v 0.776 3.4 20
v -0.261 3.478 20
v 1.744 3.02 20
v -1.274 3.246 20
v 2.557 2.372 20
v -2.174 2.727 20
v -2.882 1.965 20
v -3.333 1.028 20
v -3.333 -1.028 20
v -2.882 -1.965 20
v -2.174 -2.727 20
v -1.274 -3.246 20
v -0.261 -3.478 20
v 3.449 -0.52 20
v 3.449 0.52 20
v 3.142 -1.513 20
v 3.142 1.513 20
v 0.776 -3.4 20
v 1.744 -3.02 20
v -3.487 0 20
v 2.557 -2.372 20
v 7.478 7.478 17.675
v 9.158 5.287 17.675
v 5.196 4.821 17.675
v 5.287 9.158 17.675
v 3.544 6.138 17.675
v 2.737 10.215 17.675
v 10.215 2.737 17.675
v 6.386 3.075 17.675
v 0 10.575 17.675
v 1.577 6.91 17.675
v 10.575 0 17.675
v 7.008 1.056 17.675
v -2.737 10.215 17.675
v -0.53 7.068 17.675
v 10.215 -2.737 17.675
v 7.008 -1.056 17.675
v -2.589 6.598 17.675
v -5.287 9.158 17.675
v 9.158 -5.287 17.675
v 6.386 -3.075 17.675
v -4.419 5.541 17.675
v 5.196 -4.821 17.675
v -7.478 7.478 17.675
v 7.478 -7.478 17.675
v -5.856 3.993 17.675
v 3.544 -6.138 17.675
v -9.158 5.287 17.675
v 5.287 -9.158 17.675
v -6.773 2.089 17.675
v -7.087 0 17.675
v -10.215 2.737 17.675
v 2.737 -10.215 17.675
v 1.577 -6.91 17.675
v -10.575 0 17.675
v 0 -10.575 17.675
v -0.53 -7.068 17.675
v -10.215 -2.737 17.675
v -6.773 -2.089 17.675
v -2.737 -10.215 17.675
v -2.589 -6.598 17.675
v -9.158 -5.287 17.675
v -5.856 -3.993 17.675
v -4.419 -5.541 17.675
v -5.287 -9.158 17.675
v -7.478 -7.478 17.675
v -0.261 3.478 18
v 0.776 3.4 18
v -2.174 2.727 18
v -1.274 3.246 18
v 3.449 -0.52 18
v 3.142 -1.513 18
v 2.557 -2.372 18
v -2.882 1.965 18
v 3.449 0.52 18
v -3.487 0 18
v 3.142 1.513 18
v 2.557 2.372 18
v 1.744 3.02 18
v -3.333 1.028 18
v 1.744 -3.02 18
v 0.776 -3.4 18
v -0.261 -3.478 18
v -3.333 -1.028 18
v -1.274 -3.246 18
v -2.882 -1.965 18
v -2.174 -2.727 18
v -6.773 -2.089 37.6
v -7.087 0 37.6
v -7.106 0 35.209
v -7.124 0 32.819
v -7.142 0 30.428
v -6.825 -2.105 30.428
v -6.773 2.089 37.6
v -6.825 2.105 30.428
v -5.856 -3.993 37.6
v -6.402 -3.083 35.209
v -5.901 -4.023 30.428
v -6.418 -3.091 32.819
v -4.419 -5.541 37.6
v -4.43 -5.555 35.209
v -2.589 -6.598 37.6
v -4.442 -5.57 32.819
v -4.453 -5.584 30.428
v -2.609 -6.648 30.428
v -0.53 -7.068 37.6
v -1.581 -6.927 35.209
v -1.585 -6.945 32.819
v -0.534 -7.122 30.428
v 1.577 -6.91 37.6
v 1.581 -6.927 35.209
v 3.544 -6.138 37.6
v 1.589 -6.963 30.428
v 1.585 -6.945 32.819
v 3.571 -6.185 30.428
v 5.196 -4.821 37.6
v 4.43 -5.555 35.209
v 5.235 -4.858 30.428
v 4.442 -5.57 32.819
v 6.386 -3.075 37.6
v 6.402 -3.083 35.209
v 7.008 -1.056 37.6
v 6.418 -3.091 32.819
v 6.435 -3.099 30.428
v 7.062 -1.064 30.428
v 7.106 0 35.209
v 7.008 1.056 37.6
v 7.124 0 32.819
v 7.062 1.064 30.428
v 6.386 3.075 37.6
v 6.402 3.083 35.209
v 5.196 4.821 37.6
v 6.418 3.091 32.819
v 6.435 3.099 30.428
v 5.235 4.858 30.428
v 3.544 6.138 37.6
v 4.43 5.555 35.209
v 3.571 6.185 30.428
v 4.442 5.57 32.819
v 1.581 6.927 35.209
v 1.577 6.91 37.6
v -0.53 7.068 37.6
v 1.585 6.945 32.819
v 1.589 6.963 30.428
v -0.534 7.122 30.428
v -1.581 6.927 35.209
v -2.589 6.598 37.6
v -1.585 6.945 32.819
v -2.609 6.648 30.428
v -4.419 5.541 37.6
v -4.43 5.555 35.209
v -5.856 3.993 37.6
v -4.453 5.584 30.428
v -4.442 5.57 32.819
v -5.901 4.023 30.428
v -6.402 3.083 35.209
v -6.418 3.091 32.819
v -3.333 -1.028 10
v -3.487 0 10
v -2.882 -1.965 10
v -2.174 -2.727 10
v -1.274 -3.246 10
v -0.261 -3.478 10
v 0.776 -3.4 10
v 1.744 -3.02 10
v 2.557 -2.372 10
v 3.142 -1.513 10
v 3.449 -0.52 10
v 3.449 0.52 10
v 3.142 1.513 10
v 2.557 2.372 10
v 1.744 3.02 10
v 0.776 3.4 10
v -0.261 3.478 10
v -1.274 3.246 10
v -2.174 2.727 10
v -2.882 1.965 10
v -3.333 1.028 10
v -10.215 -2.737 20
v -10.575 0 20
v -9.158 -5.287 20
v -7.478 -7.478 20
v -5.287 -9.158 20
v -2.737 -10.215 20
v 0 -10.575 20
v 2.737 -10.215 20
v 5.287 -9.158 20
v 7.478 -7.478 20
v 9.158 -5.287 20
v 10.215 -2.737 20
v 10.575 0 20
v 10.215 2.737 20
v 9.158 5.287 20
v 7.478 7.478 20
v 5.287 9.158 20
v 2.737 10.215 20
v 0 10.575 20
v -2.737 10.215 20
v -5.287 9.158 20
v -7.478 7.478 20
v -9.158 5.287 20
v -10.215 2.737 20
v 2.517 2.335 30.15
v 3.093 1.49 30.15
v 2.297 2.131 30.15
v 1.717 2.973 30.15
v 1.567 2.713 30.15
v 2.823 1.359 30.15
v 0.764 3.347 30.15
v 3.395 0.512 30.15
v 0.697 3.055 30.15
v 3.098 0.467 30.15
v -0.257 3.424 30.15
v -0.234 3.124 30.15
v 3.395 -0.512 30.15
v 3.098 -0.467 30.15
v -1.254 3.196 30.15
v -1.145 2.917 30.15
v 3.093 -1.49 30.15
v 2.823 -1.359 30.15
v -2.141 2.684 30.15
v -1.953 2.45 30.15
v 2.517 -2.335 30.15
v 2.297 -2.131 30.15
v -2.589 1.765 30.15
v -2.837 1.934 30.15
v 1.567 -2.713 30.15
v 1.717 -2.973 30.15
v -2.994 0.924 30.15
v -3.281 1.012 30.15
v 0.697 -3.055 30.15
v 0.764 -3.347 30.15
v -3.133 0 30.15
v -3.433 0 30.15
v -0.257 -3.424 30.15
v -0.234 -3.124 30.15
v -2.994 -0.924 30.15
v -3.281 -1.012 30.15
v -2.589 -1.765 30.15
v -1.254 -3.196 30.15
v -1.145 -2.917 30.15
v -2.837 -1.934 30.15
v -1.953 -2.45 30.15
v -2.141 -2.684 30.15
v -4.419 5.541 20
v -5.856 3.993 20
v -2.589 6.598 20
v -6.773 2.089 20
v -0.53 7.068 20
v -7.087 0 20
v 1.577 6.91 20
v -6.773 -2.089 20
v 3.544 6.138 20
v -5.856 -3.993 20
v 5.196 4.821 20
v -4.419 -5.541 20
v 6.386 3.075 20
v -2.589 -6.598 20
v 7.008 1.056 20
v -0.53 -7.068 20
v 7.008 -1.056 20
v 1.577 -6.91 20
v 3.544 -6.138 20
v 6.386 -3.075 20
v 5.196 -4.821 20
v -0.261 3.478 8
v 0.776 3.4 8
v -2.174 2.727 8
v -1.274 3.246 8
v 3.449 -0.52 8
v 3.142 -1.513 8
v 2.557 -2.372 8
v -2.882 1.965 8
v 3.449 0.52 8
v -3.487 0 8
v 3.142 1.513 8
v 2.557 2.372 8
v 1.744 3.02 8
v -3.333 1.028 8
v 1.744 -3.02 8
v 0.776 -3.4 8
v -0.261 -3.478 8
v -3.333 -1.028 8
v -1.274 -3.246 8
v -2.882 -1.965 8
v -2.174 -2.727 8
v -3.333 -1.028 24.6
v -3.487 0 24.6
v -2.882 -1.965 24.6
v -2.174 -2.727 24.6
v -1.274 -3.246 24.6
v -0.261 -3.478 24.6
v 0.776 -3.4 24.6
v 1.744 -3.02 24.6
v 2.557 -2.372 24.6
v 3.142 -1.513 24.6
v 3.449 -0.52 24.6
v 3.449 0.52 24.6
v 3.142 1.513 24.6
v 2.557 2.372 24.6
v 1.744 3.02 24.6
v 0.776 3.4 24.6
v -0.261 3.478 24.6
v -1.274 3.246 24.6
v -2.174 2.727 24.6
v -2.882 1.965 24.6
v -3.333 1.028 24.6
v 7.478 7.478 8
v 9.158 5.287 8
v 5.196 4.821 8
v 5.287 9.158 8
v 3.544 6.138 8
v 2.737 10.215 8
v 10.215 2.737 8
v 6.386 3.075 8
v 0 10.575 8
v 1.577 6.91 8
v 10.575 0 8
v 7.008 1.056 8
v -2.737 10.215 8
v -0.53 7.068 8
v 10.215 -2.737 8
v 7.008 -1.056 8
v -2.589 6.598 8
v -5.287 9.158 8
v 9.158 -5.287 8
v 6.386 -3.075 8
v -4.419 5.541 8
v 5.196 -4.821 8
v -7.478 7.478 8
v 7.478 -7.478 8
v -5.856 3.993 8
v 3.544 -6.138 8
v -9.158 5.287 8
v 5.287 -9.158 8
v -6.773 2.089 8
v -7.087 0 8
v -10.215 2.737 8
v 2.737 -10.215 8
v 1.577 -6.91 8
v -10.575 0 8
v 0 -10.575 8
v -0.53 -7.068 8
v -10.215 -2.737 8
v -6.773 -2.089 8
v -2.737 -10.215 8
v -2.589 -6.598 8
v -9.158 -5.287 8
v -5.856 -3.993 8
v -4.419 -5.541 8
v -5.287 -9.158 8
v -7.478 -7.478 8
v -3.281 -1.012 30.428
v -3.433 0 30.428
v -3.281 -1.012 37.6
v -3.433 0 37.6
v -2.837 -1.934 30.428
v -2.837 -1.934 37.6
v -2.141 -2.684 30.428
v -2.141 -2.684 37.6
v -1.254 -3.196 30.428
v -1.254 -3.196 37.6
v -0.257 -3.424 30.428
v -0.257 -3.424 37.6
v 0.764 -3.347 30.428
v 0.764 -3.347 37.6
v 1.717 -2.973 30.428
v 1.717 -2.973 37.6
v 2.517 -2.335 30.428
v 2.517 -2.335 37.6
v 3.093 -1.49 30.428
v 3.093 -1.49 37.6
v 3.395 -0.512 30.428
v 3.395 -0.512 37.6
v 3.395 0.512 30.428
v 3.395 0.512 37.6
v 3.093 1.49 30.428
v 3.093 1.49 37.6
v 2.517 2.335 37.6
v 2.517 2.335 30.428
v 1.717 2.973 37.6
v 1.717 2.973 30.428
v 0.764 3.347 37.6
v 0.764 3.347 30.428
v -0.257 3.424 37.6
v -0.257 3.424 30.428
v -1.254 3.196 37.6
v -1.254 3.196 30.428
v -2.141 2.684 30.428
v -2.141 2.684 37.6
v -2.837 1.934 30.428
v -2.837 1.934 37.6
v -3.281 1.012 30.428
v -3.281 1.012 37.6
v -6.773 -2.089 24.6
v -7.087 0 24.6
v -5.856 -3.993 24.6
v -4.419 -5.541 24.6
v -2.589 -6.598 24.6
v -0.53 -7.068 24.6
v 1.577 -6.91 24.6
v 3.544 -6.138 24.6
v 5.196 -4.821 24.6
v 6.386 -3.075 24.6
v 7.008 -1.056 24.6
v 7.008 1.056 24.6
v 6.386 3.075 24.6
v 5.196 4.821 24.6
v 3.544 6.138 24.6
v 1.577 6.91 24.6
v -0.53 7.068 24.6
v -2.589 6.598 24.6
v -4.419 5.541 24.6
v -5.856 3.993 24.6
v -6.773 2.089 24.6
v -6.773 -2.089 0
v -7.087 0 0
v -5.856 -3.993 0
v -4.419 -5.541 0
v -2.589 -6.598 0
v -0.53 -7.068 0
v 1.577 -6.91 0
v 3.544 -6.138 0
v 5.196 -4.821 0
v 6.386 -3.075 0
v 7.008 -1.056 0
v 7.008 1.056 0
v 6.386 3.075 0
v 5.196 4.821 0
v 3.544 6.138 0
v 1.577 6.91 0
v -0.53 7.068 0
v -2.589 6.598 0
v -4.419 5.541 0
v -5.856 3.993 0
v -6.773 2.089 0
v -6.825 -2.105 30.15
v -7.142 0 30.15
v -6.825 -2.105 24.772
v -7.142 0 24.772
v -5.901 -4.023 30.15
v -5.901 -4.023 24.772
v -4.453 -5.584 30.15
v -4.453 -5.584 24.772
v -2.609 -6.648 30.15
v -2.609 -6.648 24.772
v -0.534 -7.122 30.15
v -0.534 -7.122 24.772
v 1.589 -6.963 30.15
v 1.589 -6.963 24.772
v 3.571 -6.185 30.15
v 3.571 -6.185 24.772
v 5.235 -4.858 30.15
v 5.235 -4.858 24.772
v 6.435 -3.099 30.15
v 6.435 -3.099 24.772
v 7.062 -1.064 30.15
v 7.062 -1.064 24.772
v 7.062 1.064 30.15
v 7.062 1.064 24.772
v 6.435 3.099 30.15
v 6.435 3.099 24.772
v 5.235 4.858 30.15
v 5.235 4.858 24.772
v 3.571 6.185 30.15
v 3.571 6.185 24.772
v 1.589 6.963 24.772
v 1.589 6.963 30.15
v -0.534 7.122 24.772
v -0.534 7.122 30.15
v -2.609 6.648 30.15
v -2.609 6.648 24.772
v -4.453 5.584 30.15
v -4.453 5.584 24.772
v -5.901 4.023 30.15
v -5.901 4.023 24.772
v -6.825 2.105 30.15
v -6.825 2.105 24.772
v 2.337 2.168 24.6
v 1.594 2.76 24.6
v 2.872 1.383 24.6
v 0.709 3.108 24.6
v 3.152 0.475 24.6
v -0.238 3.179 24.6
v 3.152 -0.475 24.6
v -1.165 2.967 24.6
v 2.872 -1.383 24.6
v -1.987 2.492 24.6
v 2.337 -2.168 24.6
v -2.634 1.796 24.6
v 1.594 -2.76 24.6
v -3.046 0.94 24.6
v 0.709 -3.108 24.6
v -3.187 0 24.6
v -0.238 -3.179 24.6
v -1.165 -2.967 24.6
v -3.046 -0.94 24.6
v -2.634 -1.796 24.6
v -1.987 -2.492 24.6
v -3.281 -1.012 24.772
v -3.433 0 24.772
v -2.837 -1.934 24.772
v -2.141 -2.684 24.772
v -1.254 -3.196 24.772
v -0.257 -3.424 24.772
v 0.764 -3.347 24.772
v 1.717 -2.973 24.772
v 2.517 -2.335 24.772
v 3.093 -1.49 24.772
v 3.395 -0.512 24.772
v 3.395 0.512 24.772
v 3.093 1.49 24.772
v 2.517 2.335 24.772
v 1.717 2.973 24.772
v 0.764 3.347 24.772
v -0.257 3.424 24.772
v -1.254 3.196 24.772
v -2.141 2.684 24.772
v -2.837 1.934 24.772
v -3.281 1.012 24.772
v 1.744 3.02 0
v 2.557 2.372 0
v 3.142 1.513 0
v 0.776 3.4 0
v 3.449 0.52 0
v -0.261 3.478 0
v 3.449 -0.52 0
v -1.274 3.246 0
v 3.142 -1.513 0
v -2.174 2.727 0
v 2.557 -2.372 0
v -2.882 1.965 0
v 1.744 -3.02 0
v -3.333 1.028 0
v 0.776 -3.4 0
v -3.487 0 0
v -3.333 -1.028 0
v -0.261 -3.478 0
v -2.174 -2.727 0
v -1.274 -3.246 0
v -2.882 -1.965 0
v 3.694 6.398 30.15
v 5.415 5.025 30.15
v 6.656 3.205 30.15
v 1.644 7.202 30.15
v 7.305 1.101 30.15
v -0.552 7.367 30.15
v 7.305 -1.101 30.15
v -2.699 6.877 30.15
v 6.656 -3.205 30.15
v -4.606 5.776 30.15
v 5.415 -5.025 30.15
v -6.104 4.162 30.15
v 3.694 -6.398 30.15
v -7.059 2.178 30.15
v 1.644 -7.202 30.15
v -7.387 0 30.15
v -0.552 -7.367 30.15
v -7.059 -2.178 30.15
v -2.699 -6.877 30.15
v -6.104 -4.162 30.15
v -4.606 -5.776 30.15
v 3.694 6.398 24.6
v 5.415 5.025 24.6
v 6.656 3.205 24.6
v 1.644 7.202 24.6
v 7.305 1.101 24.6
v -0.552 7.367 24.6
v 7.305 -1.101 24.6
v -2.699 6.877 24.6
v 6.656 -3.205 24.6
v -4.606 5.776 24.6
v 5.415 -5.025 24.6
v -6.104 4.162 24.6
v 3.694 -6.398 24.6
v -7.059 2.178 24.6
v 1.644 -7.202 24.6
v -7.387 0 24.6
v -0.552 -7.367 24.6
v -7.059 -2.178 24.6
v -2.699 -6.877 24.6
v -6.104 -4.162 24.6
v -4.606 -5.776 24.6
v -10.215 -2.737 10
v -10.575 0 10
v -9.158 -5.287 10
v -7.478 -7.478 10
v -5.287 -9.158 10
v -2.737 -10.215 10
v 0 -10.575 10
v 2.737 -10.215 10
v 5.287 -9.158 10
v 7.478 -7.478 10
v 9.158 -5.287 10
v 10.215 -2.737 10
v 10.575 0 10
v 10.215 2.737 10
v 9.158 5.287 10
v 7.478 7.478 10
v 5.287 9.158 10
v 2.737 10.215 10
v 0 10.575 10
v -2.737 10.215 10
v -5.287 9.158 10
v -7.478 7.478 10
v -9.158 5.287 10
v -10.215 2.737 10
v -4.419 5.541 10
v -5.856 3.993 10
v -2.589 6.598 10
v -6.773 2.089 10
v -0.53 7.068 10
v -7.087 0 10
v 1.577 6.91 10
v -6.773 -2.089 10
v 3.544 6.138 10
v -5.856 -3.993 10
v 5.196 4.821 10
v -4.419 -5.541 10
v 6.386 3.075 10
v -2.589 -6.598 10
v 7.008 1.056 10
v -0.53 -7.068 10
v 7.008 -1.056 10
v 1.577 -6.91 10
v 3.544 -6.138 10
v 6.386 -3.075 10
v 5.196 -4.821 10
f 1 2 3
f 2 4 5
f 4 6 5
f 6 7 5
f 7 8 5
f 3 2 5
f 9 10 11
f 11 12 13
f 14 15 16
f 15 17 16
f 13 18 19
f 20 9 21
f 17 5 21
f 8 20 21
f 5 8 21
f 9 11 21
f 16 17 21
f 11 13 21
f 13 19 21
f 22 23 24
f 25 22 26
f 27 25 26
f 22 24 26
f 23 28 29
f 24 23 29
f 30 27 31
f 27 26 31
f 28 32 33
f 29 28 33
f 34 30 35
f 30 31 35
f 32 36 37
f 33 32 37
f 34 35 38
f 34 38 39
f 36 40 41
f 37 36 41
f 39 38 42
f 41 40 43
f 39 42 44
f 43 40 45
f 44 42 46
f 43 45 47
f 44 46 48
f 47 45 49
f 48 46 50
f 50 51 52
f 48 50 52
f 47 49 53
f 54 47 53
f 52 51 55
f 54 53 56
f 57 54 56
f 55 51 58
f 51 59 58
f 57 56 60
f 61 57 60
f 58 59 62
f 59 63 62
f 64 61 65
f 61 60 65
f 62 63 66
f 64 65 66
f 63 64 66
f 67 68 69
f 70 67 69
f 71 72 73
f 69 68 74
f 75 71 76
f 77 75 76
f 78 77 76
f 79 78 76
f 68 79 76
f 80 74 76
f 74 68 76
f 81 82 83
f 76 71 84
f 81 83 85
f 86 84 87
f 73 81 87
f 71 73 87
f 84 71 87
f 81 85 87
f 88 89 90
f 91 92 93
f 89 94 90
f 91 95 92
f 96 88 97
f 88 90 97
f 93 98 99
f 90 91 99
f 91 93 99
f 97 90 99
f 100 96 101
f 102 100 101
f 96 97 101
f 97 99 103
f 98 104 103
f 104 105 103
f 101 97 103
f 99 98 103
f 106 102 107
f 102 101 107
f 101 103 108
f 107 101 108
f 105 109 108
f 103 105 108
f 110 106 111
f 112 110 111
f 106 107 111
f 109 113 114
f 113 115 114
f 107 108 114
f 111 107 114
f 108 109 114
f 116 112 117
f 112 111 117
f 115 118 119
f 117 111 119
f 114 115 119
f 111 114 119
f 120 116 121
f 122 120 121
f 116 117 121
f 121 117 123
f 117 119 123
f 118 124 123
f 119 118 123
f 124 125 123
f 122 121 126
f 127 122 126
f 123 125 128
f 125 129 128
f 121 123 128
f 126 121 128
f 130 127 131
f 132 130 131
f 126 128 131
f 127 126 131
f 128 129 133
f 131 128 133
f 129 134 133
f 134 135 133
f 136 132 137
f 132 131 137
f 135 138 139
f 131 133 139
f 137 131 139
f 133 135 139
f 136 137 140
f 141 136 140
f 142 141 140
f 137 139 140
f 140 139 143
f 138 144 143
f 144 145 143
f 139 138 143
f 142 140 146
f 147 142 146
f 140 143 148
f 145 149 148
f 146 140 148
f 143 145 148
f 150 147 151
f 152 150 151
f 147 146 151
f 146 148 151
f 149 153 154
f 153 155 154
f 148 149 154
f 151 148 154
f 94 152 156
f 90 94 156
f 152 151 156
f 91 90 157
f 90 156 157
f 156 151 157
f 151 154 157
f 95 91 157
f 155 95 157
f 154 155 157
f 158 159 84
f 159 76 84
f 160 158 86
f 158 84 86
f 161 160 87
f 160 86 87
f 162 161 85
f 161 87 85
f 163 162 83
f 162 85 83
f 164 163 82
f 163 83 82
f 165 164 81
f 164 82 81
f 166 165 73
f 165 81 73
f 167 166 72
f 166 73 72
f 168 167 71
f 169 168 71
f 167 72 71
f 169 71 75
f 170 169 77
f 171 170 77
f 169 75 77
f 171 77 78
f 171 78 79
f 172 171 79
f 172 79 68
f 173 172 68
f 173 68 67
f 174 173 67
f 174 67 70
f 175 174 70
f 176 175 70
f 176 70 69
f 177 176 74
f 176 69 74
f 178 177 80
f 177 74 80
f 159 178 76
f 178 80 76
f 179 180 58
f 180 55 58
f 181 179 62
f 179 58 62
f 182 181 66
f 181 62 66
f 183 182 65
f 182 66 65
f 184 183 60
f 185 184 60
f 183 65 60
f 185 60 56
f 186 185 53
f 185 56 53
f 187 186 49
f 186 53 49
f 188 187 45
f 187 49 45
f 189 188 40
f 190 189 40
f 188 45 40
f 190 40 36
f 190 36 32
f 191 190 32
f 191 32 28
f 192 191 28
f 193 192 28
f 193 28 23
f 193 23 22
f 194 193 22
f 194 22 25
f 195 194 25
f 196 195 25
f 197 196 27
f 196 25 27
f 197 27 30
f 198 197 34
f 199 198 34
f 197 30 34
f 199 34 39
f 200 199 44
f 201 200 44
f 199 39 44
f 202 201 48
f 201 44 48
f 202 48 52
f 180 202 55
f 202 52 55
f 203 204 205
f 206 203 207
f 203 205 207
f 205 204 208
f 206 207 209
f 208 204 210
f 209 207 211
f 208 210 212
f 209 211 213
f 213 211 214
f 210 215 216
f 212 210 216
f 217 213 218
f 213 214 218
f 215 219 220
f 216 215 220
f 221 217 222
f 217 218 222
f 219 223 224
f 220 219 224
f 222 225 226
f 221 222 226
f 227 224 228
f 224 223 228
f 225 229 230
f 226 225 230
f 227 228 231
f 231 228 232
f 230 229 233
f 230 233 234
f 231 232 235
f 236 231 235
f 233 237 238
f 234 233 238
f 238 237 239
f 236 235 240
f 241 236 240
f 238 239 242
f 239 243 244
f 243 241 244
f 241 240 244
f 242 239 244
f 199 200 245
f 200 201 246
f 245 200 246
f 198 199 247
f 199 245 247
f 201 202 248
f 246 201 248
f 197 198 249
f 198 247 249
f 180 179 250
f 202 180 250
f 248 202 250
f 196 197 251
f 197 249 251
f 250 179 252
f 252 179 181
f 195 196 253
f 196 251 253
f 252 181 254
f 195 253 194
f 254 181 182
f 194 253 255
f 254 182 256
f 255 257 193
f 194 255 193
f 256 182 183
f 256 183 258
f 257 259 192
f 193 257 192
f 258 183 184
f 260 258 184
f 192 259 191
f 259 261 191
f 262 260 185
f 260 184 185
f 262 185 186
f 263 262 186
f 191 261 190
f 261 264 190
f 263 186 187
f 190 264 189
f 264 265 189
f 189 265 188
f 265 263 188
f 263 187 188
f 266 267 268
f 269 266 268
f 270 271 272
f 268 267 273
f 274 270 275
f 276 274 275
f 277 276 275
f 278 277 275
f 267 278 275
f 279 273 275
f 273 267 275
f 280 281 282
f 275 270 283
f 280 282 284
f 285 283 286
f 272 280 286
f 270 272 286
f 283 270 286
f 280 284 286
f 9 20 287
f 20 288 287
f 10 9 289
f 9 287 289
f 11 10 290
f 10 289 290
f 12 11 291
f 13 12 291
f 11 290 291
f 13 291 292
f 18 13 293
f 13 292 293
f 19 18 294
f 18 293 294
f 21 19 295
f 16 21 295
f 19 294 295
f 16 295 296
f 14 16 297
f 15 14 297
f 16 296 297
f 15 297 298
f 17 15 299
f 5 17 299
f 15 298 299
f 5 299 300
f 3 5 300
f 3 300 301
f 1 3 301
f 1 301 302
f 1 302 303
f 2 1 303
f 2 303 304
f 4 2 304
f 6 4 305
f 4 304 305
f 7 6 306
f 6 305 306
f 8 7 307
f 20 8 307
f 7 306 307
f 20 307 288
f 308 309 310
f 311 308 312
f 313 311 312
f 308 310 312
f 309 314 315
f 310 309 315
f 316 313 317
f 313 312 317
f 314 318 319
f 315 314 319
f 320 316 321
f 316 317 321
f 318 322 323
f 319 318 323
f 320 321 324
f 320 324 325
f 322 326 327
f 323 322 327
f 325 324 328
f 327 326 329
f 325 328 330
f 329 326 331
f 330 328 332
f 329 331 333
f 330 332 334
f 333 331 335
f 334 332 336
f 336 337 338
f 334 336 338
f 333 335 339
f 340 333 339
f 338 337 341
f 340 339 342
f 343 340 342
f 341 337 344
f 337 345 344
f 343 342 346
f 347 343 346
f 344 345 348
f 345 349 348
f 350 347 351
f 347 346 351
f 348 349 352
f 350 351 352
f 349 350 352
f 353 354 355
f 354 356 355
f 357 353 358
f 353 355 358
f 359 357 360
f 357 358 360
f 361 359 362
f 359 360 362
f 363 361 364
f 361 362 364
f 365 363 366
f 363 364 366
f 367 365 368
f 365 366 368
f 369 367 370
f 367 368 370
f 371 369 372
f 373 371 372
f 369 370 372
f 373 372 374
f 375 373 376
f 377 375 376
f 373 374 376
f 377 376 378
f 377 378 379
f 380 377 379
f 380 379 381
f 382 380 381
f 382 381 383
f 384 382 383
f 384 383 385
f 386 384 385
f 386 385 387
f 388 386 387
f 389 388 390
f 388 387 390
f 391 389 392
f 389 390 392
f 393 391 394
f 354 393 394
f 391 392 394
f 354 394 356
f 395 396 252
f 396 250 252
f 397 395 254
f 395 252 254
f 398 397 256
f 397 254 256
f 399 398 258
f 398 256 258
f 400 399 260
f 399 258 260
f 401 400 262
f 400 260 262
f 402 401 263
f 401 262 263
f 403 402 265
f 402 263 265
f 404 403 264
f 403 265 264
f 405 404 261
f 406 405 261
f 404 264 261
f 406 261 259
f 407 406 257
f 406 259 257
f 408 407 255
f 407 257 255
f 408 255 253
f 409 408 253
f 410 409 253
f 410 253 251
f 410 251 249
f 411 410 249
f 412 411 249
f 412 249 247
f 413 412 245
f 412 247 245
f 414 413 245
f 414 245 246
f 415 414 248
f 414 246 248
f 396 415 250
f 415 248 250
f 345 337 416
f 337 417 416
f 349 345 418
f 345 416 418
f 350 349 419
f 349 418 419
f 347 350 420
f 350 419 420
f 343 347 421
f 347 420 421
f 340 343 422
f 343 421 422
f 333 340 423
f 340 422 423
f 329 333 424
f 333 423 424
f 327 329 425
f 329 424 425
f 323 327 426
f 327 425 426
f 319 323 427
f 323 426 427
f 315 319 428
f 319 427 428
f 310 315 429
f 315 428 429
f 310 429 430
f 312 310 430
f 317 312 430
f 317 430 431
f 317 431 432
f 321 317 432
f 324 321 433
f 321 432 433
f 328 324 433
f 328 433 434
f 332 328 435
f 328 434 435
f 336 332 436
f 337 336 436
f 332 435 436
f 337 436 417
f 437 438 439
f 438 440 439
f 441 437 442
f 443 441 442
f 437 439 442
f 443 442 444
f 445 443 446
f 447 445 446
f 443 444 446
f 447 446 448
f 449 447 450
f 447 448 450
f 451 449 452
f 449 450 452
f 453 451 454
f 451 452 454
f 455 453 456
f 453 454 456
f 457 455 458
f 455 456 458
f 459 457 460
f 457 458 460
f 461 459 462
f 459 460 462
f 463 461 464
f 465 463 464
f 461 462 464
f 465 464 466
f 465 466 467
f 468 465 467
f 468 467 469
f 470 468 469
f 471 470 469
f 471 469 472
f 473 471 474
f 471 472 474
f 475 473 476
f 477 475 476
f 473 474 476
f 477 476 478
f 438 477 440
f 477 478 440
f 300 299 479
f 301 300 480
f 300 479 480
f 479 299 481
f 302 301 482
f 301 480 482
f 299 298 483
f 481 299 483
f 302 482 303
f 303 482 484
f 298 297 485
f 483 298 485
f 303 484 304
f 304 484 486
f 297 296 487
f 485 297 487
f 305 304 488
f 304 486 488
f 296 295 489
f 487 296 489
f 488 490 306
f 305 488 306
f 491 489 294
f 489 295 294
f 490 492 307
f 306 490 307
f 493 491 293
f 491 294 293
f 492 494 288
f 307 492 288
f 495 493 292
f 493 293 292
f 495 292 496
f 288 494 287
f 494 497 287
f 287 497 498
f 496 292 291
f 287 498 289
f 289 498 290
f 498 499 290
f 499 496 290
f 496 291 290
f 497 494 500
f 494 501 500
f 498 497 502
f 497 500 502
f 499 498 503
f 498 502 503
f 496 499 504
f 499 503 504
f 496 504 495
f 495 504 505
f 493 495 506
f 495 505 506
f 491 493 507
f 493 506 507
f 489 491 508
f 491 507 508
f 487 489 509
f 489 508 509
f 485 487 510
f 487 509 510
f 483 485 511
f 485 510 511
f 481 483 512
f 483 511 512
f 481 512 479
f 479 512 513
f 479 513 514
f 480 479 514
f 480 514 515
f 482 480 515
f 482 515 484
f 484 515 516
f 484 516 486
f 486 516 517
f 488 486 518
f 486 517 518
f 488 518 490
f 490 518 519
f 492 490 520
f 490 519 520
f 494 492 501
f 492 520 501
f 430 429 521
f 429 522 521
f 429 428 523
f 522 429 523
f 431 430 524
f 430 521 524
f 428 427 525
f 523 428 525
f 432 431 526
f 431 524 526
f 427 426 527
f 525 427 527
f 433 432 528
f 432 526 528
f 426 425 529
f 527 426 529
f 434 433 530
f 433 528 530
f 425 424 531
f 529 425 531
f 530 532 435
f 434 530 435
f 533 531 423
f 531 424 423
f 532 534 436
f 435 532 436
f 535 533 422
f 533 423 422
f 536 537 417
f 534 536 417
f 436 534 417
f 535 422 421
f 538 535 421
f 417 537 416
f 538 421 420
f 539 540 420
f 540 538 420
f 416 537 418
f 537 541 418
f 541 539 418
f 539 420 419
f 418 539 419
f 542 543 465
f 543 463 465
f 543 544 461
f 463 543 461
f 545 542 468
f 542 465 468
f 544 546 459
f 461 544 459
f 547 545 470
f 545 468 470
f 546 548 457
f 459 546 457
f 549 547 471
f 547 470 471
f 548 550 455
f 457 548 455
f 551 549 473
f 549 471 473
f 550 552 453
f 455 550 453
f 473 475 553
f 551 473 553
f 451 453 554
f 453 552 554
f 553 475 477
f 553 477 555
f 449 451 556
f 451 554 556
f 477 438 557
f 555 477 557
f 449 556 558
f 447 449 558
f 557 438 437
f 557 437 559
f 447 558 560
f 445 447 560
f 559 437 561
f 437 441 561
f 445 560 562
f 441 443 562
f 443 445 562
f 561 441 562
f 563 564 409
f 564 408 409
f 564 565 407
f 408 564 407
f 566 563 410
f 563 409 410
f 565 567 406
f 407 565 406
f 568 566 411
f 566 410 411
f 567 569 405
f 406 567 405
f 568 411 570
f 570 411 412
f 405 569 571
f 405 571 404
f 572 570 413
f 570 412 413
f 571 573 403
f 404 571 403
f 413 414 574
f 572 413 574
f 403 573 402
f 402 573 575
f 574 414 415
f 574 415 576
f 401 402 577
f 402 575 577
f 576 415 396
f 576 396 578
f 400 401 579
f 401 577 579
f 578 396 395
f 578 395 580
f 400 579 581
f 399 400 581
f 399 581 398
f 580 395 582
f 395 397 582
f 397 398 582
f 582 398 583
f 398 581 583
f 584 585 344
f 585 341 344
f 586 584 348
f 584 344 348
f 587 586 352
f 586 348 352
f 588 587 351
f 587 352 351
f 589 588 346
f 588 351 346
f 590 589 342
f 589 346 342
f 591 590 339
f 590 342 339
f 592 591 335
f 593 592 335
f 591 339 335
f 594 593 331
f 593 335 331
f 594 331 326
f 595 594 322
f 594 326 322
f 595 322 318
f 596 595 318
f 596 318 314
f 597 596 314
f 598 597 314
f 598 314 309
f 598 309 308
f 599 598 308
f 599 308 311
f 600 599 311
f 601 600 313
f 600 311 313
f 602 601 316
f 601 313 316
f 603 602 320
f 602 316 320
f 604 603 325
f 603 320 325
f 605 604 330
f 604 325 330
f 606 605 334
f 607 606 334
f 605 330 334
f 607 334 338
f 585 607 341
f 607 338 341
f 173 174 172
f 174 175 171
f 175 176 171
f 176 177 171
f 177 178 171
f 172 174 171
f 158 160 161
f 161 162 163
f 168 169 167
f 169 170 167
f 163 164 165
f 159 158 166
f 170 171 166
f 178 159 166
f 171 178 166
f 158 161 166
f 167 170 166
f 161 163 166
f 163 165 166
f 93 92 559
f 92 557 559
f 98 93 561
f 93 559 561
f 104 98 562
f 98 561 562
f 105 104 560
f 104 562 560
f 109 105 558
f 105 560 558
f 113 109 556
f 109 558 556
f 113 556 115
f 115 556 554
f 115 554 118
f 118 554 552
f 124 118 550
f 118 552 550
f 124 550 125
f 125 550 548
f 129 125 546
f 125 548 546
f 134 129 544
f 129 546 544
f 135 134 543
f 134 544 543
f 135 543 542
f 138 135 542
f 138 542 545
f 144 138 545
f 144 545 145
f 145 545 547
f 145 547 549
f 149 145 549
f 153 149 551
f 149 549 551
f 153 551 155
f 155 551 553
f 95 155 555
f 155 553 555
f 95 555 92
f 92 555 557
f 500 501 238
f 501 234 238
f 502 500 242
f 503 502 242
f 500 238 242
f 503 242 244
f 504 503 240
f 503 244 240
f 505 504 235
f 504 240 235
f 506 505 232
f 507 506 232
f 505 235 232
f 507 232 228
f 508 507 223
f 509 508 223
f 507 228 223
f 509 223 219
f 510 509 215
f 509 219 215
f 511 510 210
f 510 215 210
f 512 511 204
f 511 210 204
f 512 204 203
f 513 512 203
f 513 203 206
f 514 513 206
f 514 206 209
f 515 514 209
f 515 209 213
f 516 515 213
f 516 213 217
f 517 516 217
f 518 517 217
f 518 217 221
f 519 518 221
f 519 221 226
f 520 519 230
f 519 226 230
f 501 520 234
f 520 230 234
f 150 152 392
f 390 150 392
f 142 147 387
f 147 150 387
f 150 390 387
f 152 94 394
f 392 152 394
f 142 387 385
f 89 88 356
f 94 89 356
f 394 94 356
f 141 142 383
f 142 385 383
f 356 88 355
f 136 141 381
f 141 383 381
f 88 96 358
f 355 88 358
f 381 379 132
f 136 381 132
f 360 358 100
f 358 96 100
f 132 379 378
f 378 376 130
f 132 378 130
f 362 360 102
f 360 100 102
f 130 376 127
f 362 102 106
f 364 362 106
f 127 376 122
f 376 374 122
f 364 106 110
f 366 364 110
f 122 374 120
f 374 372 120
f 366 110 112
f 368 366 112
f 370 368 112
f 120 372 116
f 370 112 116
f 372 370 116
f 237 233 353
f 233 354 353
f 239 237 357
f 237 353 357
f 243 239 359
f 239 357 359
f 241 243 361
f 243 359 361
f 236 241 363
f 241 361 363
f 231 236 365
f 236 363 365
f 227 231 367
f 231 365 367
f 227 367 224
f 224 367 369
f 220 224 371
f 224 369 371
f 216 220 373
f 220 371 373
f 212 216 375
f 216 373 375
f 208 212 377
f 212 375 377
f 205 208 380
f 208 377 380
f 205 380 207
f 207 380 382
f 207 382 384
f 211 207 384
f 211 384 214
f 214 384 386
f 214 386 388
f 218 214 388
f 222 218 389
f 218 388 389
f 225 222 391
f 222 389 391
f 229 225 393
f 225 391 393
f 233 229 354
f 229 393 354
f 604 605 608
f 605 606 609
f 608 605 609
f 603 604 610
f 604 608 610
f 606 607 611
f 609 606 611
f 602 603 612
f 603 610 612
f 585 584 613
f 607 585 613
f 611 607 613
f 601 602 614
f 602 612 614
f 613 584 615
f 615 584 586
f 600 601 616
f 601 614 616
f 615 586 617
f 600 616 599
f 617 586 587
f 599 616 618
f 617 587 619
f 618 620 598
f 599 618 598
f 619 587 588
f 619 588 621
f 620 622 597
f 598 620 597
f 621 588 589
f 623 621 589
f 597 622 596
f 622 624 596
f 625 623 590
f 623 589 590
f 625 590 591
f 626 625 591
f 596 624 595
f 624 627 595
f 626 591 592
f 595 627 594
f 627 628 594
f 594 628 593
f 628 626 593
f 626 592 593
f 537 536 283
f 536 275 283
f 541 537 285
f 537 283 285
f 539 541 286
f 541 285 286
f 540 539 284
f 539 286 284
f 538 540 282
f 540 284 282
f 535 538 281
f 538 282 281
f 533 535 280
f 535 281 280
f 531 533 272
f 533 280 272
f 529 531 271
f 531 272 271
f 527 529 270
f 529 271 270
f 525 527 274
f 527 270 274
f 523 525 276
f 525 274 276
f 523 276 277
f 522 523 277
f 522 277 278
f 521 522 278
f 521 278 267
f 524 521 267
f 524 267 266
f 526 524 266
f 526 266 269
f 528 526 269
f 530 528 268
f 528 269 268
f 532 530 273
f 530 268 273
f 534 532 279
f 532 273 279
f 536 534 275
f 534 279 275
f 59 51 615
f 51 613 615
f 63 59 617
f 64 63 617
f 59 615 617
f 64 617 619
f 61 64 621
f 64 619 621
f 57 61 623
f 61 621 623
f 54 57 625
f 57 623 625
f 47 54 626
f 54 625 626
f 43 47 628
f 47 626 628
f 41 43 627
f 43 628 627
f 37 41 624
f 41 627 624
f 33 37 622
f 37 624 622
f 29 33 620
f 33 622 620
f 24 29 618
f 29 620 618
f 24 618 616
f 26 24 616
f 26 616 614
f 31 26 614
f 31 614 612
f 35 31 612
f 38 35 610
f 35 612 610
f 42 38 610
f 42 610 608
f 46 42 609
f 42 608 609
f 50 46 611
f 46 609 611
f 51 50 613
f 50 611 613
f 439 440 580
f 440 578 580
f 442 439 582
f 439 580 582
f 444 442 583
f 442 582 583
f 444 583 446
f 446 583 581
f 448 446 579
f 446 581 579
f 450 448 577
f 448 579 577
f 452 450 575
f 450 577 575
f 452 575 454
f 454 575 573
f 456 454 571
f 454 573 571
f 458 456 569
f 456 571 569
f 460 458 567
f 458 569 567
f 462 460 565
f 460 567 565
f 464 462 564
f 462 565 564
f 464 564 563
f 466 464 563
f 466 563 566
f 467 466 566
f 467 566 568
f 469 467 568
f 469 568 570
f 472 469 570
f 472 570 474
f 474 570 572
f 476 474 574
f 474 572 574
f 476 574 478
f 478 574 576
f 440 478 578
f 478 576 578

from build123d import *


with BuildPart() as f1:
    # F0 (on Front) → F1 (revolve)
    with BuildSketch(Plane.XZ):
        Polygon((-7.087499, 8), (-7.087499, 0), (-3.487499, 0), (-3.487499, 8), (0, 8), (0, 10), (-3.487499, 10), (-3.487499, 18), (0, 18), (0, 20), (-3.487499, 20), (-3.487499, 24.6), (-3.187499, 24.6), (-3.433158, 24.772198), (-3.433158, 30.150307), (-3.133158, 30.150307), (-3.433158, 30.428462), (-3.433158, 37.6), (-7.087499, 37.6), (-7.141841, 30.428462), (-7.387499, 30.150307), (-7.141841, 30.150307), (-7.141841, 24.772198), (-7.387499, 24.6), (-7.087499, 24.6), (-7.087499, 20), (-10.574999, 20), (-10.574999, 17.674999), (-7.087499, 17.674999), (-7.087499, 10), (-10.574999, 10), (-10.574999, 8), align=None)
    revolve(axis=Axis((0, 0, 19), (0, 0, 1)))


solid = f1.part
